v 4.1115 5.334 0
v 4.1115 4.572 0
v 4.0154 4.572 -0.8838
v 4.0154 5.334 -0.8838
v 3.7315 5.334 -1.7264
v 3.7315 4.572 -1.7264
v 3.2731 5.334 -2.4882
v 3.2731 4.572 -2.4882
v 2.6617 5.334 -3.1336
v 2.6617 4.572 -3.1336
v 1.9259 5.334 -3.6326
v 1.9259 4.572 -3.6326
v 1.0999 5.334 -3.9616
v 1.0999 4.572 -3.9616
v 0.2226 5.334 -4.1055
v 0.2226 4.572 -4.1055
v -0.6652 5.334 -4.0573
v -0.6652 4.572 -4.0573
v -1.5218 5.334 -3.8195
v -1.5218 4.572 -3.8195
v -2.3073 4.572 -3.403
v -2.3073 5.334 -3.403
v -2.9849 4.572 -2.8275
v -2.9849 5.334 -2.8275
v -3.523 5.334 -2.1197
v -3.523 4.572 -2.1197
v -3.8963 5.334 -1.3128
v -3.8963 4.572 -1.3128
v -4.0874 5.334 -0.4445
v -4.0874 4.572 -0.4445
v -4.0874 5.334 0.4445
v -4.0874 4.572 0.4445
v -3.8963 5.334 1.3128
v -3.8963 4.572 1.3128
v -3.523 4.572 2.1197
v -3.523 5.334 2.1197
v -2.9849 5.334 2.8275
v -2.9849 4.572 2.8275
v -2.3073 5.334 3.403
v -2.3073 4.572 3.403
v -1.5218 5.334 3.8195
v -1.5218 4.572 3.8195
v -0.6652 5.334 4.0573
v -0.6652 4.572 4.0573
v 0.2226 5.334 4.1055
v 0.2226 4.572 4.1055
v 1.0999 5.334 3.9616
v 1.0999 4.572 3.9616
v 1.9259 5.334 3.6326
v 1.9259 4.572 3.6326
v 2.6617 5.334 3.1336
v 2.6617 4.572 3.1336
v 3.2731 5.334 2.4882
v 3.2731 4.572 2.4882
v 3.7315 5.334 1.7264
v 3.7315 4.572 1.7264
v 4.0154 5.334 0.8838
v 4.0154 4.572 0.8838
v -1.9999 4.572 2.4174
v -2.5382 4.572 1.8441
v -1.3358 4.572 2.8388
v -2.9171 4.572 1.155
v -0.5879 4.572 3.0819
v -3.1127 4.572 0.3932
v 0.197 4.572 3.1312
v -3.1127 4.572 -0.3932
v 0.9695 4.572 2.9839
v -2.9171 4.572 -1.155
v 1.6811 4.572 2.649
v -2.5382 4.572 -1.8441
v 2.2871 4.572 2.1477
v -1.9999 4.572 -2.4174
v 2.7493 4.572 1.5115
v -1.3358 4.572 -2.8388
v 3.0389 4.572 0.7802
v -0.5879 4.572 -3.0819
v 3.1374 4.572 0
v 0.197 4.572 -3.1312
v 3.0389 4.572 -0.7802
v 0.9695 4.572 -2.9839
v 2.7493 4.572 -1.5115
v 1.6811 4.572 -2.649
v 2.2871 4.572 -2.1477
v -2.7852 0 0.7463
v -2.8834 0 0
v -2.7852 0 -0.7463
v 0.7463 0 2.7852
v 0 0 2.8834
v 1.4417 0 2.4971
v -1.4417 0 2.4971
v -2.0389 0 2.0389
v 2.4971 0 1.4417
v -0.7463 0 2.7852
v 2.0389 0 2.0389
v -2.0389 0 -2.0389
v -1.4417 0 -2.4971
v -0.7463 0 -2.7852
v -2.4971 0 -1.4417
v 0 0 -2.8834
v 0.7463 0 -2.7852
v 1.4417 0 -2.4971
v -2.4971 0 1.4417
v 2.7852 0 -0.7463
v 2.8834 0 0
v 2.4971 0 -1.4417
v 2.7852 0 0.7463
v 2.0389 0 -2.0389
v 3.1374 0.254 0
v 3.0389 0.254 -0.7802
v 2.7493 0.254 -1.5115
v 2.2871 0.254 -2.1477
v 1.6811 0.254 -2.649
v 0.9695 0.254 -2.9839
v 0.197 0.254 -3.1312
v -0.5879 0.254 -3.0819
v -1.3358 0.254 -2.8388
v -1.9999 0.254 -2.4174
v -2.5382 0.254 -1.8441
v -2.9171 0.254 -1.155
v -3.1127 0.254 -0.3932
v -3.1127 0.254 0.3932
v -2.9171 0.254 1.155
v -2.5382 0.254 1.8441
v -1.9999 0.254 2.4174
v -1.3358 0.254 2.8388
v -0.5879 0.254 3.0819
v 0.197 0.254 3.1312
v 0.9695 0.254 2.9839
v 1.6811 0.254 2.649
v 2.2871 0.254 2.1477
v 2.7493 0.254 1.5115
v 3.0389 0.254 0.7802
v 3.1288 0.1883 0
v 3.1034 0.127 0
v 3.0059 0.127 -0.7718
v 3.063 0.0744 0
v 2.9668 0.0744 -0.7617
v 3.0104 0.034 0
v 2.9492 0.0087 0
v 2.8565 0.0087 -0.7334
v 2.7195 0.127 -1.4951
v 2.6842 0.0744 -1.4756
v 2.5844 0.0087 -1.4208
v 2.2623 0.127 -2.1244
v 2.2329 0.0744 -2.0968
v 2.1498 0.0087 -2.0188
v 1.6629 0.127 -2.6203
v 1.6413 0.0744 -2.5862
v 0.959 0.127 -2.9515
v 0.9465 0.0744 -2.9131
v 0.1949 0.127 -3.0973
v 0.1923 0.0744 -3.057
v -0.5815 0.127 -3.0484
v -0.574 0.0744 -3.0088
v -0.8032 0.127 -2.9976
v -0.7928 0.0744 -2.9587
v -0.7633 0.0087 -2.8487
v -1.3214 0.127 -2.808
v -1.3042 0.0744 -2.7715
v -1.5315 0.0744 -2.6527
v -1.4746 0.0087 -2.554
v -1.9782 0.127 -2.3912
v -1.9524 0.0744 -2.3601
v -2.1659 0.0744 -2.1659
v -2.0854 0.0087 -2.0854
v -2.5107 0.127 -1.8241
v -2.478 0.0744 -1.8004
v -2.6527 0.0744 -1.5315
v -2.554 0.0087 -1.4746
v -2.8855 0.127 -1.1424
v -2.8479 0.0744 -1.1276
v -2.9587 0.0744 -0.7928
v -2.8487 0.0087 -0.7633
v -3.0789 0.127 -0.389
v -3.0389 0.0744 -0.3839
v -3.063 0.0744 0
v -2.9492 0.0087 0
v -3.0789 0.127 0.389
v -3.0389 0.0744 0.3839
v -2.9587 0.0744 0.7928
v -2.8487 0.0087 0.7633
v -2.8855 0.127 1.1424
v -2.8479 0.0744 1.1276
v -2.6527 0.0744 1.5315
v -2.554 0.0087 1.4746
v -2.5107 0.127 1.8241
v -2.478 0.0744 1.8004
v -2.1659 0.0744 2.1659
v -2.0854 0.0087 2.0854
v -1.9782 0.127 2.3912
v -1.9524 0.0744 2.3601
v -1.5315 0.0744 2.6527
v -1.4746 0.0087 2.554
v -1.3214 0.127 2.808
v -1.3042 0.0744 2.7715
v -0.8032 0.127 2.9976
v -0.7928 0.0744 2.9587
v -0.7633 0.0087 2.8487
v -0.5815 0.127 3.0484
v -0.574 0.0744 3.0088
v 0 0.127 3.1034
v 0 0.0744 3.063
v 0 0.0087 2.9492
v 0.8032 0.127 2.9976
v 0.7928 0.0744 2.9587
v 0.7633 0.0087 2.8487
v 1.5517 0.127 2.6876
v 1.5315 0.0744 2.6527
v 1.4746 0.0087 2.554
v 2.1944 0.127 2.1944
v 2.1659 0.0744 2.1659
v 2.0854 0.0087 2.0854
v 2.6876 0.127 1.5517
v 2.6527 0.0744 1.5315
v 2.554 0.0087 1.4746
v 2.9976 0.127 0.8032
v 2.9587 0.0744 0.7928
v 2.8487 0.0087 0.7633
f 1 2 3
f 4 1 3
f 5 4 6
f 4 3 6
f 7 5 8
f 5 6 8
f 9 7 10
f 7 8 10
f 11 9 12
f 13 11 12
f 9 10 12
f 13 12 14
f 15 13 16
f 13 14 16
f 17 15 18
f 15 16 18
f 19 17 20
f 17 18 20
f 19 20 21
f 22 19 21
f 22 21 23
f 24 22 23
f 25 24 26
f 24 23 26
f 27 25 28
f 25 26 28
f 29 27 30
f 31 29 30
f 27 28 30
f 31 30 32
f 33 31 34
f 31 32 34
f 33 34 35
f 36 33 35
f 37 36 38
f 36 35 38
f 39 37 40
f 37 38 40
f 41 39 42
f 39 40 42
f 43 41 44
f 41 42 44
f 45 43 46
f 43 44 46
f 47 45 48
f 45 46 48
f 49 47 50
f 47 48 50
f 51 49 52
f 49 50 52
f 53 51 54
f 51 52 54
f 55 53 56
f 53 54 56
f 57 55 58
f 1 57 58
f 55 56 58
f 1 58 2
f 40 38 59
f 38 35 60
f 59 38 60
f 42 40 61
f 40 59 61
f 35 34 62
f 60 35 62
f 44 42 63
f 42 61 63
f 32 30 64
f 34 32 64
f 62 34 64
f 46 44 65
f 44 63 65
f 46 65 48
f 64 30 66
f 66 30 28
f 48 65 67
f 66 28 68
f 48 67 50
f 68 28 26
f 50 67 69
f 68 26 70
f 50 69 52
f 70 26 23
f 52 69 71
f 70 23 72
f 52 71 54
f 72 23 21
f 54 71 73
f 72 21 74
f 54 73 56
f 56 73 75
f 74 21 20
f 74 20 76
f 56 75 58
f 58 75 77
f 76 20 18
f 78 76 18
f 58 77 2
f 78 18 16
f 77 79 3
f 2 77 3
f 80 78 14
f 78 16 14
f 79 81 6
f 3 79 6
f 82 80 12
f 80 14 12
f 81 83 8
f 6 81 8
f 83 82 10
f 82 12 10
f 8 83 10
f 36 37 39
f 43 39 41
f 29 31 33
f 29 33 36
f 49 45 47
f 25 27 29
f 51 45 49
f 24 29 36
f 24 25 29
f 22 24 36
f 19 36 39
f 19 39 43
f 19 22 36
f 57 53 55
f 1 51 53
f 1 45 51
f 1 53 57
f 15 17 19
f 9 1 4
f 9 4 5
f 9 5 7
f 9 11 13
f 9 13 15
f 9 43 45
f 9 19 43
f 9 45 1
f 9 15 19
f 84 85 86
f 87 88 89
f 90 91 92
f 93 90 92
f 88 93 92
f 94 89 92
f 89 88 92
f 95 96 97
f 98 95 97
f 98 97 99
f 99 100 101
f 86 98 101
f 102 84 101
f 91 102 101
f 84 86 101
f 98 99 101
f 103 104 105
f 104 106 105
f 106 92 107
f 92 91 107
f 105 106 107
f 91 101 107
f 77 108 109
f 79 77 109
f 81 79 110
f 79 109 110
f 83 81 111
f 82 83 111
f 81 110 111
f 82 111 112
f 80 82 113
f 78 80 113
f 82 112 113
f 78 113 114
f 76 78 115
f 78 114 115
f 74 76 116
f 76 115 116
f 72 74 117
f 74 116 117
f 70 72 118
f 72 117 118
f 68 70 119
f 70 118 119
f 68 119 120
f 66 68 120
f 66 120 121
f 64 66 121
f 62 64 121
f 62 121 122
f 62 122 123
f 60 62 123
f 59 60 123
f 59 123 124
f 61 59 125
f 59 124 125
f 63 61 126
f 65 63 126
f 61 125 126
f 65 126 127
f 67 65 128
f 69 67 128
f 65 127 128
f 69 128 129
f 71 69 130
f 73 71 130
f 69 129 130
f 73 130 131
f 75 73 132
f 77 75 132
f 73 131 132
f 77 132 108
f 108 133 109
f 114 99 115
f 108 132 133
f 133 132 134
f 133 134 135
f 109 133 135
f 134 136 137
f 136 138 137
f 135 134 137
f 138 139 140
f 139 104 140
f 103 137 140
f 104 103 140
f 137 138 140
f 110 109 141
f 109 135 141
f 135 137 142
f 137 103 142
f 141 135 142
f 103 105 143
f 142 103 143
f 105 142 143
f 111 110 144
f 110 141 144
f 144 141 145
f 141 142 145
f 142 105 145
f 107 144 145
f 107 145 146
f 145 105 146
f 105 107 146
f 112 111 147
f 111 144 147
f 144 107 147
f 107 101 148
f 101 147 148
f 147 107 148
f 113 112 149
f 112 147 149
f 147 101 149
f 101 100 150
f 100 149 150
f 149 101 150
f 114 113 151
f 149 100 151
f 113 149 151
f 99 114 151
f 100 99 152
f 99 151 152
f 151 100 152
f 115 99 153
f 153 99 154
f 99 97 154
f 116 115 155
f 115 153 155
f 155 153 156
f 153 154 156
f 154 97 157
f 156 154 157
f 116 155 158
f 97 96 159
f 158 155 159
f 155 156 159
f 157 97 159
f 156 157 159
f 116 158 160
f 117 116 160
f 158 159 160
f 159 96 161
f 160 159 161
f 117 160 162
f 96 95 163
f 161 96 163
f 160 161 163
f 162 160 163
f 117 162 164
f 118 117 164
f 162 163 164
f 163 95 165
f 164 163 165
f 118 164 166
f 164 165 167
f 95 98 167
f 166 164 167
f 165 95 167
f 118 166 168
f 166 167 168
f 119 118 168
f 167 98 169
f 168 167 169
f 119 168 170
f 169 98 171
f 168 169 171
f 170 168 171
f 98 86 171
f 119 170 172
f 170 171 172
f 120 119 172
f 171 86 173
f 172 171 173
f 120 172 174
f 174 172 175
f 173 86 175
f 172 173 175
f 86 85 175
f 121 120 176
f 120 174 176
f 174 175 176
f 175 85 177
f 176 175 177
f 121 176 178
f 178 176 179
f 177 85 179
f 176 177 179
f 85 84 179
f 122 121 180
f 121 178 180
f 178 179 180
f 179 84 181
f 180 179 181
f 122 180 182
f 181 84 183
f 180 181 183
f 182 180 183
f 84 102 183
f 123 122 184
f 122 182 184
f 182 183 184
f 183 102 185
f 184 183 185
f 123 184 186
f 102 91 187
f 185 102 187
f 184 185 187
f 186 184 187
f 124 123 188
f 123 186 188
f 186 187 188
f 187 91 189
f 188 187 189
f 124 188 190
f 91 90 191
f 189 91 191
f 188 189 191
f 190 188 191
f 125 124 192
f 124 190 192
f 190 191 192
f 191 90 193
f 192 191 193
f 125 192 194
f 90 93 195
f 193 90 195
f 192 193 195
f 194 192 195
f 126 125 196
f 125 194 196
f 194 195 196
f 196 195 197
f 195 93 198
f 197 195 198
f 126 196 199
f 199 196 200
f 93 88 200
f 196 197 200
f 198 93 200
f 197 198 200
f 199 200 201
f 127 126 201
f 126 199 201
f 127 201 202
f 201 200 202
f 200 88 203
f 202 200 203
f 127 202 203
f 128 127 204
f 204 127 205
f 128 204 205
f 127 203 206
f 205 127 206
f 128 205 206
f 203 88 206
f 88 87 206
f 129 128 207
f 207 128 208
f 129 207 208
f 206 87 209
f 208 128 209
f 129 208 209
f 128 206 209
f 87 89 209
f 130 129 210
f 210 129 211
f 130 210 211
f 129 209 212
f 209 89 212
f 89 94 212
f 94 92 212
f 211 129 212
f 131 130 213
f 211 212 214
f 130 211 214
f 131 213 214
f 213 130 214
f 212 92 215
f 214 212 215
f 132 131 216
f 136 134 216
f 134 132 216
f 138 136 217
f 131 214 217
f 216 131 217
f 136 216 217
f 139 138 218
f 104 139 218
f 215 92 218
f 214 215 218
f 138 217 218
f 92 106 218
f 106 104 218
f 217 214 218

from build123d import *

# Parameters (mm, degrees)
SKETCH1_R           = 3.137422597
BOSS_EXTRUDE1_DEPTH = 4.572
FILLET3_R           = 0.254
SKETCH2_R           = 4.111492789
BOSS_EXTRUDE3_DEPTH = 0.762


with BuildPart() as part:
    # Sketch1 → Boss-Extrude1 (new body)
    with BuildSketch(Plane(origin=(0, 0, 0), x_dir=(1, 0, 0), z_dir=(0, 1, 0))):
        Circle(SKETCH1_R)
    extrude(amount=BOSS_EXTRUDE1_DEPTH)

    # Fillet3
    fillet3_edges = [part.edges().sort_by_distance(p)[0] for p in [
        (-3.137422597, 0, 0),
    ]]
    fillet(fillet3_edges, radius=FILLET3_R)

    # Sketch2 → Boss-Extrude3 (add)
    with BuildSketch(Plane(origin=(0, 4.572, 0), x_dir=(1, 0, 0), z_dir=(0, 1, 0))):
        Circle(SKETCH2_R)
    extrude(amount=BOSS_EXTRUDE3_DEPTH)


solid = part.part
